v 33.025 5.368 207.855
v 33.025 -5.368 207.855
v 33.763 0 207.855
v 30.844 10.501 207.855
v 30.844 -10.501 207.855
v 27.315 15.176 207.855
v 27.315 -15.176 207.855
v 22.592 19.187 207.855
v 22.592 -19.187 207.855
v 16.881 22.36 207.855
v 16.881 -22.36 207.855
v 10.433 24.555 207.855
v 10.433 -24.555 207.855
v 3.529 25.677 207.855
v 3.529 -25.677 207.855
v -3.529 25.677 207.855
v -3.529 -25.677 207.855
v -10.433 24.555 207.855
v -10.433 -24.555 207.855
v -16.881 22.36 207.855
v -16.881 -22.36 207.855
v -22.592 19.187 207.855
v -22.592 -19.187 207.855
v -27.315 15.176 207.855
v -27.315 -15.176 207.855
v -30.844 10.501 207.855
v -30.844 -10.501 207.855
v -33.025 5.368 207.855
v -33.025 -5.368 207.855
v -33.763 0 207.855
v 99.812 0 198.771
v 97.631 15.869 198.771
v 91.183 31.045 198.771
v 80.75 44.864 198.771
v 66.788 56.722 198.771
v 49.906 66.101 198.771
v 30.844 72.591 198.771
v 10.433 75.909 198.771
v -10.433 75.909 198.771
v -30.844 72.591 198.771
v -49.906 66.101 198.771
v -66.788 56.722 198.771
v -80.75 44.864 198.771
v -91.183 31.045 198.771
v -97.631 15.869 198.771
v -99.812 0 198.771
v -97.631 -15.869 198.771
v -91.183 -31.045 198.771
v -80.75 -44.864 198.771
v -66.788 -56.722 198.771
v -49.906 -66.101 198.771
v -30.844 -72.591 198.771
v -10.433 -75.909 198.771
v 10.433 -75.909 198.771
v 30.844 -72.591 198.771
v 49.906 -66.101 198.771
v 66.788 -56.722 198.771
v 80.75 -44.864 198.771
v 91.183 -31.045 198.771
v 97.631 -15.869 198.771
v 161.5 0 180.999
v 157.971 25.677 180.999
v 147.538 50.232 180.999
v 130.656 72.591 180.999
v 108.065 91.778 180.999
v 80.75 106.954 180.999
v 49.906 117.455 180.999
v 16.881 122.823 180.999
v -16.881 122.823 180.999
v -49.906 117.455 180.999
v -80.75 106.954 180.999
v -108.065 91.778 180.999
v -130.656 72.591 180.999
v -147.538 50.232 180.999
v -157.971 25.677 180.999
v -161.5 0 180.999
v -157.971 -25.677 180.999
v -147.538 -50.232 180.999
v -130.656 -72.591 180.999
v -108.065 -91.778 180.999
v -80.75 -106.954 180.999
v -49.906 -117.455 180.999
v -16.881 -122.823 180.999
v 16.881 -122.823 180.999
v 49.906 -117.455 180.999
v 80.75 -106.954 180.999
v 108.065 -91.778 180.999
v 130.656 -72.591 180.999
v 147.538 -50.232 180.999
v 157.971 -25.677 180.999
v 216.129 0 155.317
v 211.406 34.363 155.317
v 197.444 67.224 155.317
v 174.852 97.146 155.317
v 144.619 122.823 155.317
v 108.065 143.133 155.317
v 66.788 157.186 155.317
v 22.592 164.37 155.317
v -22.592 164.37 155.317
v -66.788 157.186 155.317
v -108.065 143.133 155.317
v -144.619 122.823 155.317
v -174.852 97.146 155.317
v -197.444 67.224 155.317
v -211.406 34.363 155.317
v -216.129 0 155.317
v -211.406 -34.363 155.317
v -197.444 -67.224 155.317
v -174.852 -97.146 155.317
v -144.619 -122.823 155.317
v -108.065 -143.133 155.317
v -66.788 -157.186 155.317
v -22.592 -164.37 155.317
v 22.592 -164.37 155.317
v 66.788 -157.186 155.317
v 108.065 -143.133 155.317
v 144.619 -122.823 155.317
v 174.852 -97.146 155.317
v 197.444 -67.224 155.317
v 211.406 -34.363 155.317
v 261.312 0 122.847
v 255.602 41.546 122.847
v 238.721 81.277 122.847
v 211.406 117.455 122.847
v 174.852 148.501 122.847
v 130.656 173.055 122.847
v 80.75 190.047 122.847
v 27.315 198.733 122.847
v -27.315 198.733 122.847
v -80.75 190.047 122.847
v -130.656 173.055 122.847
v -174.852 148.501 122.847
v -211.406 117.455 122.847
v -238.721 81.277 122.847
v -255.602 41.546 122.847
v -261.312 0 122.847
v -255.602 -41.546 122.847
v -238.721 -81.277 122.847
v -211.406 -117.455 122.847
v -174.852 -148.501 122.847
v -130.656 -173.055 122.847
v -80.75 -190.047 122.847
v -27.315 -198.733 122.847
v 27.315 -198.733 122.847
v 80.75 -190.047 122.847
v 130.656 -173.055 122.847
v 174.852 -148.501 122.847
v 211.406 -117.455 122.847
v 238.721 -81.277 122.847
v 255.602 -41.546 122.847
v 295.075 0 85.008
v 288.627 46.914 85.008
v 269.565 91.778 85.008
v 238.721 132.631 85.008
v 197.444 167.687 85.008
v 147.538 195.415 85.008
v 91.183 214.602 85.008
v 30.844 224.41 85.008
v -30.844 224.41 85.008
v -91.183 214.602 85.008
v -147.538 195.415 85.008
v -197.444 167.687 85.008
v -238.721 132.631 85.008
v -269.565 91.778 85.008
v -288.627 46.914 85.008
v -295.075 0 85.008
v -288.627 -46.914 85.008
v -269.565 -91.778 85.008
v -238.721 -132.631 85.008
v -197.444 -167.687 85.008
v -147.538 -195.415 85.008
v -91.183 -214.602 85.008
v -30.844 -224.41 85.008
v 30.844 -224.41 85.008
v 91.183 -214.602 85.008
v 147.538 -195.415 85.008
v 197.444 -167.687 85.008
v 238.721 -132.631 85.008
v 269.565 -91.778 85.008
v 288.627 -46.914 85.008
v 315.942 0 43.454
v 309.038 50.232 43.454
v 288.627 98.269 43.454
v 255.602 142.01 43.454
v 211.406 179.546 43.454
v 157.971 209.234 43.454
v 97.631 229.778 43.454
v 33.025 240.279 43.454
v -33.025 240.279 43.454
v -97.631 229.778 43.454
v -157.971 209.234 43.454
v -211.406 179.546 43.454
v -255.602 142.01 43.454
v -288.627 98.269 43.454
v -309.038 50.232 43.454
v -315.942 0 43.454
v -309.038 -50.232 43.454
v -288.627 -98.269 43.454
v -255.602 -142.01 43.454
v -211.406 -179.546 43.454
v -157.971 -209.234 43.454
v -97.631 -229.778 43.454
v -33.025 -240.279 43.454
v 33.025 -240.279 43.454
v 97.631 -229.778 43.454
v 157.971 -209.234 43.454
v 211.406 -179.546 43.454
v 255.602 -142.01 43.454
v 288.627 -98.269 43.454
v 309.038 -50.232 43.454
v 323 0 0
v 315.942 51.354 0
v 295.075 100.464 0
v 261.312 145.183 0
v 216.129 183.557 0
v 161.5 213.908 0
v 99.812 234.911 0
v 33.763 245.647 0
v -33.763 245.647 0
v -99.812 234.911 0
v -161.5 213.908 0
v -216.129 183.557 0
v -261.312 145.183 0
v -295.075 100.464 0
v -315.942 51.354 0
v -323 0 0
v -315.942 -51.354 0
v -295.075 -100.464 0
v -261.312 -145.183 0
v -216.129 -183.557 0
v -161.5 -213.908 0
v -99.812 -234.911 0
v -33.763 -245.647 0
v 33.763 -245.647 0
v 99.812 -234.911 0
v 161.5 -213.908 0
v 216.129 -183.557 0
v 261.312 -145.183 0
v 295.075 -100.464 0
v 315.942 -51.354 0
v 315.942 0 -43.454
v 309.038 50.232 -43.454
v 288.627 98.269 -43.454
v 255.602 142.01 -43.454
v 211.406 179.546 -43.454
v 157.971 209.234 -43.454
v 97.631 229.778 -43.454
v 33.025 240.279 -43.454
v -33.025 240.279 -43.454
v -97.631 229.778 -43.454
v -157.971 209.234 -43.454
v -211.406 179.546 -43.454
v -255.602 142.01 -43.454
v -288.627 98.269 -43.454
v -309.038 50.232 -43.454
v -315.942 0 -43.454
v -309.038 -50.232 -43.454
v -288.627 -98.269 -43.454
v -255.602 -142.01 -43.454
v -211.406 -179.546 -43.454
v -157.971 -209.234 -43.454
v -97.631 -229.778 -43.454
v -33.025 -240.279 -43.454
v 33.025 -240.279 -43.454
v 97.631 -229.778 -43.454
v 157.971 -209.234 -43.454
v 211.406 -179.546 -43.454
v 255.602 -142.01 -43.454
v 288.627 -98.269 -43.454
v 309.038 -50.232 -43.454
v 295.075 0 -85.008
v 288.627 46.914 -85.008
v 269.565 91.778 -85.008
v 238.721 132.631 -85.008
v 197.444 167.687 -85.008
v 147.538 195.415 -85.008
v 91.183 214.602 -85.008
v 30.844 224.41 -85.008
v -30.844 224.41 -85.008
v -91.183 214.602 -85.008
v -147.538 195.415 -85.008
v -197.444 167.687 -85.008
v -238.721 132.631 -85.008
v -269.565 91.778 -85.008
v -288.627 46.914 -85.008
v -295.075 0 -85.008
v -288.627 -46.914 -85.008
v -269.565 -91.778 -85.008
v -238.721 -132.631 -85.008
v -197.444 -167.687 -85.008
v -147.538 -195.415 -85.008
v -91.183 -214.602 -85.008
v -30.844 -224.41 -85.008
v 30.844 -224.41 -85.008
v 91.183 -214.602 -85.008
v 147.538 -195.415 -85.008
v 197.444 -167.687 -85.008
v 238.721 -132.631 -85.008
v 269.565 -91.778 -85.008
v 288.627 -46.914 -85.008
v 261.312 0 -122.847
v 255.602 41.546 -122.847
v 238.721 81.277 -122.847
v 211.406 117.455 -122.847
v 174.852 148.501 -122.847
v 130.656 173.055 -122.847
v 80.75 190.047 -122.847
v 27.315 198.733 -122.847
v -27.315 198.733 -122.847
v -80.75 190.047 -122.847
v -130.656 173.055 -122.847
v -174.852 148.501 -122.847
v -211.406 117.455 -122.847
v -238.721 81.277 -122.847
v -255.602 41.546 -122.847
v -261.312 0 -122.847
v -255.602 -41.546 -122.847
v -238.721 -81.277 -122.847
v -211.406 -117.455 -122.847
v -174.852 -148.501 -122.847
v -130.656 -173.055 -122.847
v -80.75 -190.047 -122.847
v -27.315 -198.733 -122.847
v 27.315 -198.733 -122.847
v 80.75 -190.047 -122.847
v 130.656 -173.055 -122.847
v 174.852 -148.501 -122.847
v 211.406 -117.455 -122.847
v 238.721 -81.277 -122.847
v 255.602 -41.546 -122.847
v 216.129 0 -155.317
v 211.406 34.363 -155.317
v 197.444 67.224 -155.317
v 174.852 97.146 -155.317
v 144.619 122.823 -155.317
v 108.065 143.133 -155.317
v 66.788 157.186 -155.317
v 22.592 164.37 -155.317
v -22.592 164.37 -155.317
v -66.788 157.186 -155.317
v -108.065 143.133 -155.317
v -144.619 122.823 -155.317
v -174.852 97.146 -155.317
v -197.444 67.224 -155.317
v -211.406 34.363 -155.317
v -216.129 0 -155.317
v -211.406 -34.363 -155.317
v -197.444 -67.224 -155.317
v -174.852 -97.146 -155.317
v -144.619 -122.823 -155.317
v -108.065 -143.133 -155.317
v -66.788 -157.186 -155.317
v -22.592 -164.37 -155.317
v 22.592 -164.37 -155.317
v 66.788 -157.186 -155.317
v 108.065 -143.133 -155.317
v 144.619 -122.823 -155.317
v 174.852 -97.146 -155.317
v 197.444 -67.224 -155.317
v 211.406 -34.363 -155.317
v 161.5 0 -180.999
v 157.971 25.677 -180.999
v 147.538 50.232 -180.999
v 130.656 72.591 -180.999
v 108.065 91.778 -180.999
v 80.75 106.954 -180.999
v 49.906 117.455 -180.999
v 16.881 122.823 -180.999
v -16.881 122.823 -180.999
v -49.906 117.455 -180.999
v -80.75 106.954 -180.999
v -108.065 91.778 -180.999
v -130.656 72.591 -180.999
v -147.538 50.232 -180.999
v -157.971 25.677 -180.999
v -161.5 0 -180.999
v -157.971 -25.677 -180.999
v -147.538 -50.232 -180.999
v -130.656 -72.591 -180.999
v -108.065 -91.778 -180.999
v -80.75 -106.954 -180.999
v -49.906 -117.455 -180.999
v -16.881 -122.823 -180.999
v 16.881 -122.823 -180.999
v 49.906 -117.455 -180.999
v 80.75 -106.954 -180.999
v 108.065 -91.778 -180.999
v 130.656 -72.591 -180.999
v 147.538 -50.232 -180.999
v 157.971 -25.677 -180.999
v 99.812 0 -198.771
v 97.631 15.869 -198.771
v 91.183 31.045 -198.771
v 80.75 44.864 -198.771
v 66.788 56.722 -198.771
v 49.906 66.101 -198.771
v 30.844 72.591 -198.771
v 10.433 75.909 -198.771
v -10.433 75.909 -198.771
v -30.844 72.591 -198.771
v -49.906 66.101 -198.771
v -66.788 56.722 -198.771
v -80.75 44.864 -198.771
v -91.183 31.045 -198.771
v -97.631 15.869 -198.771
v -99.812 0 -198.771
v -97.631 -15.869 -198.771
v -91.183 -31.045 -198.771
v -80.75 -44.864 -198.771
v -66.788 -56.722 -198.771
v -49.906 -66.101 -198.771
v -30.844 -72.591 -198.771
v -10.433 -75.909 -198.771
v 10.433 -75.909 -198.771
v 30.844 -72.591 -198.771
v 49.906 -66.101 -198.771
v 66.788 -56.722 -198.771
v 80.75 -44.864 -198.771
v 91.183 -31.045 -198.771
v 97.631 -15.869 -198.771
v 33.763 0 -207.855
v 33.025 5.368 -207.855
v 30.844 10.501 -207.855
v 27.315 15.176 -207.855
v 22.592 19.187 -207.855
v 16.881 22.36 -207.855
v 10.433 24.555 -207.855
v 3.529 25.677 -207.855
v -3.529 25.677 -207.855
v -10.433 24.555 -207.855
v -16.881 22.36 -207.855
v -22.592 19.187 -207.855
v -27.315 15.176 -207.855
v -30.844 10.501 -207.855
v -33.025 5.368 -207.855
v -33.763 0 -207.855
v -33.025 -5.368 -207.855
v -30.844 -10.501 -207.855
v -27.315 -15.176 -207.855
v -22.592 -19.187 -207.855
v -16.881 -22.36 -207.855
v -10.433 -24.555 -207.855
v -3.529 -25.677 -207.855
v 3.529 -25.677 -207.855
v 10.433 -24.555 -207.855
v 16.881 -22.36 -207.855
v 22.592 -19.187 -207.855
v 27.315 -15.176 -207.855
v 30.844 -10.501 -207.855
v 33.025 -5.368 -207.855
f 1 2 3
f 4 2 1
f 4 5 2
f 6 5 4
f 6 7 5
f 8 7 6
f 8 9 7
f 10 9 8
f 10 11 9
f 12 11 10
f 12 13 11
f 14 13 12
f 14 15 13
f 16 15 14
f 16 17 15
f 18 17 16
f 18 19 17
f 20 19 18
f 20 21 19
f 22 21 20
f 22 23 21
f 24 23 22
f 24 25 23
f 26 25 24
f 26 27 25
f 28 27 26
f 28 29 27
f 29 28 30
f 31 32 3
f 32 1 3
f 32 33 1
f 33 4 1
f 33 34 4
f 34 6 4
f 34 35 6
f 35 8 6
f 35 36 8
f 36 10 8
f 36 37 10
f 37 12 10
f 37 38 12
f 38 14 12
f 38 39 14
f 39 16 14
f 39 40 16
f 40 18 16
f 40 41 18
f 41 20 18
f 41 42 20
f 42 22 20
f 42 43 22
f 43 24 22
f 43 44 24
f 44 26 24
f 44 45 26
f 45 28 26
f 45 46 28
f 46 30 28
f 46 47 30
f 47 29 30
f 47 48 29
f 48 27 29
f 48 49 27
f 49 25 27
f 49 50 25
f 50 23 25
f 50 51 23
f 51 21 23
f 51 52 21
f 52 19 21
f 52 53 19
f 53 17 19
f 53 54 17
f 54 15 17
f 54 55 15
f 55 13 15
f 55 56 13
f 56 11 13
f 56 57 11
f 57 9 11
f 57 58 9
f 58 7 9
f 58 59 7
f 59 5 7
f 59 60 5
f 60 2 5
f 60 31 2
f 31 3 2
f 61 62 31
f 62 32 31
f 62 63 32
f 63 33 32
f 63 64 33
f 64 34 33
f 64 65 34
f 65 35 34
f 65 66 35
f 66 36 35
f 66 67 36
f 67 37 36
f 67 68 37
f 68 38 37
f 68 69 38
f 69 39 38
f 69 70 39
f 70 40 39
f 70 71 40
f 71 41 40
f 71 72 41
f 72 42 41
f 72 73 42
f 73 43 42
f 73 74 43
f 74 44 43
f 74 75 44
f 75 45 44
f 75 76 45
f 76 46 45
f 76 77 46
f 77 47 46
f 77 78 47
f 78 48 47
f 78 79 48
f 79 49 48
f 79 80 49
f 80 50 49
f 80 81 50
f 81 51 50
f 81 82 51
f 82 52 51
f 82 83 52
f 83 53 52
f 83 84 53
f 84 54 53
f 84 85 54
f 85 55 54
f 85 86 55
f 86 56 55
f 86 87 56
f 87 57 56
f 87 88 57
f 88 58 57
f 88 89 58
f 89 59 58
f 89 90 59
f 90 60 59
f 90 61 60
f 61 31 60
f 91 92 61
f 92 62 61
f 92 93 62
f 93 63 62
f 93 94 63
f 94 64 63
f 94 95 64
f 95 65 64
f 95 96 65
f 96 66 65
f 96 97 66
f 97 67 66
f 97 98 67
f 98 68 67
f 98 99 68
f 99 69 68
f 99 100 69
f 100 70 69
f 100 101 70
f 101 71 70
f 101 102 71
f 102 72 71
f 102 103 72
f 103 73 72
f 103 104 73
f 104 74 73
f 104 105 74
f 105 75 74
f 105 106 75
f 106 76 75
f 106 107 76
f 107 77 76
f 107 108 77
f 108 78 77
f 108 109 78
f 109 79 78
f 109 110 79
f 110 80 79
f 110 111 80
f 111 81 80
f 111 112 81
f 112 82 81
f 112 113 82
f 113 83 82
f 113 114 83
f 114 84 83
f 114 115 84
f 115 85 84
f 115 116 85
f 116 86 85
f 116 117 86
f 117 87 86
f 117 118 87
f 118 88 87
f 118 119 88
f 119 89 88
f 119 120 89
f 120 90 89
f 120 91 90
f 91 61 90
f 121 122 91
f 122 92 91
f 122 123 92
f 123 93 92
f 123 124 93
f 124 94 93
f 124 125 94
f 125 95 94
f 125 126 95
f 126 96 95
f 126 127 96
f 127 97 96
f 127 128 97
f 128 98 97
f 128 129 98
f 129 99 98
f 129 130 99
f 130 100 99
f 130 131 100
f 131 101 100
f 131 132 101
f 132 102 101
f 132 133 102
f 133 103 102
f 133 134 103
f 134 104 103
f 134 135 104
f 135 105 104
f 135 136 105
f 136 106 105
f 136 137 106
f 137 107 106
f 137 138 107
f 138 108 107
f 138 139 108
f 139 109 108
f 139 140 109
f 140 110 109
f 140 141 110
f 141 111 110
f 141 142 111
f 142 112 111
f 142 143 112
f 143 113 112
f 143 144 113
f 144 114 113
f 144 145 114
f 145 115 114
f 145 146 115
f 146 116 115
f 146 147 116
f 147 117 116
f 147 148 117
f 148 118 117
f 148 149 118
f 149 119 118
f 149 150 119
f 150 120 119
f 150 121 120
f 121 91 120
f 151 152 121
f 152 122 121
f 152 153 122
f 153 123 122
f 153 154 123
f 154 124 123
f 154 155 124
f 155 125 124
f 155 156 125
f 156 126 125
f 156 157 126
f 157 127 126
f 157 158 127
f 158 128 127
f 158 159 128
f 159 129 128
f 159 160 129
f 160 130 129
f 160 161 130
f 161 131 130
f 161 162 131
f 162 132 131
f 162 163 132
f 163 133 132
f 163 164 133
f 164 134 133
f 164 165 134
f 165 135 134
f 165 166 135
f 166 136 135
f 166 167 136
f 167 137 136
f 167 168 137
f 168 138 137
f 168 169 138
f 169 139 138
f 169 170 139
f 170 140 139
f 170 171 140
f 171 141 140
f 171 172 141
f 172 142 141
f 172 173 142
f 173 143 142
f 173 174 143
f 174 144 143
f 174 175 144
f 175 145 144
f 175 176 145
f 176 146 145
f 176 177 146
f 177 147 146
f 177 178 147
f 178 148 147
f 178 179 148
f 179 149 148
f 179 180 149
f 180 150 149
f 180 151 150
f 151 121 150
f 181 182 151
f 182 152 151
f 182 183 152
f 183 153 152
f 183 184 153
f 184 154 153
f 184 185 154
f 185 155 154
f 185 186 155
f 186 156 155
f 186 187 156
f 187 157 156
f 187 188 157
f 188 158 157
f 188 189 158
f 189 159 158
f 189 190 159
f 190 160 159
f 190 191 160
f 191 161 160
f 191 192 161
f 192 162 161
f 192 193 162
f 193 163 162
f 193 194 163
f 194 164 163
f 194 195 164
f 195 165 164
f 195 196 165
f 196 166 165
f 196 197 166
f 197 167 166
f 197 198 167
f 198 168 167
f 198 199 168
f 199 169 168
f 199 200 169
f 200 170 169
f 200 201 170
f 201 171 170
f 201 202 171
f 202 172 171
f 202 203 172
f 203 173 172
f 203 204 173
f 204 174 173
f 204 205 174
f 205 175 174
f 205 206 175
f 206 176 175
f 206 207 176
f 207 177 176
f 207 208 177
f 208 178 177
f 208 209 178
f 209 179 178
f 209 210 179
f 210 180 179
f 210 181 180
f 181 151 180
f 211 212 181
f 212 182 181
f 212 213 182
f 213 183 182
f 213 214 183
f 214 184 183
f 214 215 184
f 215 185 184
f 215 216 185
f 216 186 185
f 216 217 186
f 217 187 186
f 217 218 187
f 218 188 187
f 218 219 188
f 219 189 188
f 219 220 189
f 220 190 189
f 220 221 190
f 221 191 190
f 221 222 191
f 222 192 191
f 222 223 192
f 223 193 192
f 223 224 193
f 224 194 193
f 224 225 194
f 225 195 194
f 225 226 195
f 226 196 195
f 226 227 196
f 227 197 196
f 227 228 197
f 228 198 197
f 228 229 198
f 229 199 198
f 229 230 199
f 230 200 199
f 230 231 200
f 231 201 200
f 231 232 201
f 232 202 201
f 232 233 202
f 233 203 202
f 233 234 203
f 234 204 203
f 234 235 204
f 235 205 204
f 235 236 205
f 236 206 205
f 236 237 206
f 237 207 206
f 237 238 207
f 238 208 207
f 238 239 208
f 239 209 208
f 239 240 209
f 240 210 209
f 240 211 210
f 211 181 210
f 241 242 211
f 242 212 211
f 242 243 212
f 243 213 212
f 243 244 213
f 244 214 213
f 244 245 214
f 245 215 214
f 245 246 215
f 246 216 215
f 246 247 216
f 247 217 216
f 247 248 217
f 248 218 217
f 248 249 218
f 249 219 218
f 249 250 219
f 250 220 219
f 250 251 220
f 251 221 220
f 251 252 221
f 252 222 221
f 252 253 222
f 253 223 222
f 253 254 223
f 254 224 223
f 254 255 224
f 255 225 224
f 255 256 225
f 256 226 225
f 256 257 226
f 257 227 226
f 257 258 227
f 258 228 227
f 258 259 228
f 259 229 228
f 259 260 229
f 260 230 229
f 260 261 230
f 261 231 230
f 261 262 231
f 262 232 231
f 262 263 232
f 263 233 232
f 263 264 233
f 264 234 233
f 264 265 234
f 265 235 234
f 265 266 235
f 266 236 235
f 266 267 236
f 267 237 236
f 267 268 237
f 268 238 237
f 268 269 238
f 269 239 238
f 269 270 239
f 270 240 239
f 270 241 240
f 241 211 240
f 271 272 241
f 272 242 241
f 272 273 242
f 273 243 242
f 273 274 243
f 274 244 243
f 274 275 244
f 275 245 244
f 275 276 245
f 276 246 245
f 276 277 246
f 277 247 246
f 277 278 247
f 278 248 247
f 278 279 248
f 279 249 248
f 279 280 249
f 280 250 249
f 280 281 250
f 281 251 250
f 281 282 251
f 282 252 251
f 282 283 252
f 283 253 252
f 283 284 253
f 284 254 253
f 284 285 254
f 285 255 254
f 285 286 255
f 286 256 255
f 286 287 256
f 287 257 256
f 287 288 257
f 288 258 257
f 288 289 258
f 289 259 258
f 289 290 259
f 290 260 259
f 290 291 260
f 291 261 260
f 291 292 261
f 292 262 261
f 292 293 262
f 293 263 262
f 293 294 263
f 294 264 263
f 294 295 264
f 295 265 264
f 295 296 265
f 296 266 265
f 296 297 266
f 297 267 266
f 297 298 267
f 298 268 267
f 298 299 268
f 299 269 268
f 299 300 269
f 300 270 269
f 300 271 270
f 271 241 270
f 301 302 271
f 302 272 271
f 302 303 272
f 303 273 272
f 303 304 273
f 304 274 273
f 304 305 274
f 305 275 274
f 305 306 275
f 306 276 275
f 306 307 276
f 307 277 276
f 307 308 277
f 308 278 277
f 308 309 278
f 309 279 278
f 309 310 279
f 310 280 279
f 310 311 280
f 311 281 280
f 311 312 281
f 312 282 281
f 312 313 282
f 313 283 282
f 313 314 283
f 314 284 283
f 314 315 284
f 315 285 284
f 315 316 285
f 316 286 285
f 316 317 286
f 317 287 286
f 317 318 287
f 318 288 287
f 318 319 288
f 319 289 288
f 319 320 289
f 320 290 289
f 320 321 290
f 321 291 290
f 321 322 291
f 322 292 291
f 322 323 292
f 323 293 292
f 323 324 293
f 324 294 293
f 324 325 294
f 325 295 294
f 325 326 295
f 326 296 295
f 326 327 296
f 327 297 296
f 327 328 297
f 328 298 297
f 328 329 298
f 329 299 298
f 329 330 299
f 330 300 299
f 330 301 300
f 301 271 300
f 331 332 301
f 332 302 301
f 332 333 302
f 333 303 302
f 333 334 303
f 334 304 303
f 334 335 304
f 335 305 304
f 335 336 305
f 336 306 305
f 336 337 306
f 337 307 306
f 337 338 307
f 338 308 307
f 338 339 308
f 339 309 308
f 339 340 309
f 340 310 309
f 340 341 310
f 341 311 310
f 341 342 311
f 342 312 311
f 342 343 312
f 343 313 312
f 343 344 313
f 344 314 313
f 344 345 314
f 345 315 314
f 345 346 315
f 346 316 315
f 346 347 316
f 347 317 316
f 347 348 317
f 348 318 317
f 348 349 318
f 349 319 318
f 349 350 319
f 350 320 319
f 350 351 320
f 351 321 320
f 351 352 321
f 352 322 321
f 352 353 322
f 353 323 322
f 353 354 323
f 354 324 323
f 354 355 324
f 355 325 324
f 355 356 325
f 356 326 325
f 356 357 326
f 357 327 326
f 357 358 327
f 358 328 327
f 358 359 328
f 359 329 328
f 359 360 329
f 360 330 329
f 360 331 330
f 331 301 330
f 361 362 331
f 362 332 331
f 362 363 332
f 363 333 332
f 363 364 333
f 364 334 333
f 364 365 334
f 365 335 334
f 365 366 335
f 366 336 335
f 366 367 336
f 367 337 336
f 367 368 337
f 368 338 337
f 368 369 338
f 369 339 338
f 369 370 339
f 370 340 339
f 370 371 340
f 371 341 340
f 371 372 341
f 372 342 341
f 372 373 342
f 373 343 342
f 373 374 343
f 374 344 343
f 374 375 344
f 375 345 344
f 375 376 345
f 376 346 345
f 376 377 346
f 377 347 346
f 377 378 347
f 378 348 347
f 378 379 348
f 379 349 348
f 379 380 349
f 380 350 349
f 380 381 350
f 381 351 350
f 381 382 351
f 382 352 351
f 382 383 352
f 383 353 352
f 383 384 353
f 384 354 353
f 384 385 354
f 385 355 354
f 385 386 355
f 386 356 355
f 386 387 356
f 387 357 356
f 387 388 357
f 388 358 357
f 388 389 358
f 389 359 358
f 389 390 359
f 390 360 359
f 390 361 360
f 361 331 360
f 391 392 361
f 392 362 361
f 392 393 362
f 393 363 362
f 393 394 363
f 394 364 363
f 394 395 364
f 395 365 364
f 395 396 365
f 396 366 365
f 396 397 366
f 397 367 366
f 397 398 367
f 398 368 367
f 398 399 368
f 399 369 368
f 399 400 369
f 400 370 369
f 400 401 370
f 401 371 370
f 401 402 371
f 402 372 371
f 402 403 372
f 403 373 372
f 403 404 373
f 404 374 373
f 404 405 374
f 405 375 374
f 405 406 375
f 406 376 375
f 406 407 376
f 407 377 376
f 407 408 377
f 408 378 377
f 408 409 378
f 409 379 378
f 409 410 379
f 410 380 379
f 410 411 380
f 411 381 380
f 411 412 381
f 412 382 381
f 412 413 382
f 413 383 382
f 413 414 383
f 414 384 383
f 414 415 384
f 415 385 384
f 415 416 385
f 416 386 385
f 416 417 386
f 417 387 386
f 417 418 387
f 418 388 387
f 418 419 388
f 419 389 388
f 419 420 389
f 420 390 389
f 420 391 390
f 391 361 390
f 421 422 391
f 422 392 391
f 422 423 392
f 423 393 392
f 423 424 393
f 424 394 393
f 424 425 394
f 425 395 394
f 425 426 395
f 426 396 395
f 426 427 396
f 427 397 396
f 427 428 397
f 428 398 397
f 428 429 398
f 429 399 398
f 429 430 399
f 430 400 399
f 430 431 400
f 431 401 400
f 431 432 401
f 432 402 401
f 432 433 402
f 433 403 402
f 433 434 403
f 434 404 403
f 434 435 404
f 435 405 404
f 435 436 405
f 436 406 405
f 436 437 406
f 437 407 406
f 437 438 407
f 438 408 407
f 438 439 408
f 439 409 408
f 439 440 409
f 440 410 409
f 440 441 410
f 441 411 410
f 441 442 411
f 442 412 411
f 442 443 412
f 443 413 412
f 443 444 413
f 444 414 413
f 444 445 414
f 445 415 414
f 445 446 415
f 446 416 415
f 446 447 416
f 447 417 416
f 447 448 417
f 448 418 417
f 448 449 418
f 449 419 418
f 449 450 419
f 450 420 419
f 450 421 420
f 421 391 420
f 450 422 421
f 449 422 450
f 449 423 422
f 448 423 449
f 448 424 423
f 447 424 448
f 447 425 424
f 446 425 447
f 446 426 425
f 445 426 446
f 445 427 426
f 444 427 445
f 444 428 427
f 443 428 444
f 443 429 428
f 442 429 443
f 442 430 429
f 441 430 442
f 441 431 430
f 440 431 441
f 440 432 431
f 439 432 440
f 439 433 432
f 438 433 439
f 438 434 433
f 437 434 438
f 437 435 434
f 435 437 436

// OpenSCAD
// Generated by SolidPython 1.0.1 on 2020-07-29 00:46:53


scale(v = [17, 13, 11]) {
	sphere(r = 19);
}
/***********************************************
*********      SolidPython code:      **********
************************************************
 
# import packages: SolidPython
from solid import *
from solid.utils import *
from itertools import chain, combinations, permutations


class Resize:

    def __init__(self, scad_file):
        self.scad_file = scad_file
        #self.scad_file = import_scad(scad_file)
        # cone/cylinder param:
        self.r1 = 0
        self.r2 = 0
        self.h = 0
        # rectangular prism param:
        self.w = 0
        self.l = 0
        # ellipse param:
        self.r = 0

    # import OpenScad code (file name corresponds to shape)


    # classify shape + parameters
    def assign(self, param1, param2, param3):
        if self.scad_file == 'cone.scad':
            self.r1 = param1
            self.r2 = param2
            self.h = param3
        elif self.scad_file == 'cylinder.scad':
            self.r1 = param1
            self.r2 = param2
            self.h = param3
        elif self.scad_file == 'rectangularPrism.scad':
            self.h = param1
            self.l = param2
            self.w = param3
        else:
            self.r = param1
            self.h = param2

    # resize parameters
    def iterate(self):
        x = range(3, 20, 2)
        i = 1
        if self.scad_file == 'cone.scad':
            tempList = list(permutations(x, 2))
            for temp in tempList:
                param1 = temp[0]
                param2 = temp[1]
                filepath = 'produced_scad_files/' + 'cone' + str(param1) + '_' + str(param2) + '_' + '.scad'
                scad_render_to_file(cylinder(h=param1, r1=param2, r2=0), filepath)

        elif self.scad_file == 'cylinder.scad':
            tempList = list(permutations(x, 3))
            for temp in tempList:
                param1 = temp[0]
                param2 = temp[1]
                filepath = 'produced_scad_files/' + 'cylinder' + str(param1) + '_' + str(param2) + '_' + '.scad'
                scad_render_to_file(cylinder(h=param1, r1=param2, r2=param2), filepath)

        elif self.scad_file == 'rectangularPrism.scad':
            tempList = list(permutations(x, 3))
            for temp in tempList:
                param1 = temp[0]
                param2 = temp[1]
                param3 = temp[2]
                filepath = 'produced_scad_files/' + 'rectangularPrism' + str(param1) + '_' + str(param2) + '_' + str(
                    param3) + '.scad'
                scad_render_to_file(cube(size=(param1, param2, param3)), filepath)

        elif self.scad_file == 'ellipse.scad':
            tempList = list(permutations(x, 4))
            for temp in tempList:
                param1 = temp[0]
                param2 = temp[1]
                param3 = temp[2]
                param4 = temp[3]
                filepath = 'produced_scad_files/' + 'ellipse' + str(param1) + '_' + str(param2) + '_' + str(param3) + '_' + str(param4) + '.scad'
                scad_render_to_file(scale([param1, param2, param3])(sphere(r=param4)), filepath)

    def render_to_scadfile(self):
        scad_render_to_file(scad, 'example.scad') 
 
************************************************/
